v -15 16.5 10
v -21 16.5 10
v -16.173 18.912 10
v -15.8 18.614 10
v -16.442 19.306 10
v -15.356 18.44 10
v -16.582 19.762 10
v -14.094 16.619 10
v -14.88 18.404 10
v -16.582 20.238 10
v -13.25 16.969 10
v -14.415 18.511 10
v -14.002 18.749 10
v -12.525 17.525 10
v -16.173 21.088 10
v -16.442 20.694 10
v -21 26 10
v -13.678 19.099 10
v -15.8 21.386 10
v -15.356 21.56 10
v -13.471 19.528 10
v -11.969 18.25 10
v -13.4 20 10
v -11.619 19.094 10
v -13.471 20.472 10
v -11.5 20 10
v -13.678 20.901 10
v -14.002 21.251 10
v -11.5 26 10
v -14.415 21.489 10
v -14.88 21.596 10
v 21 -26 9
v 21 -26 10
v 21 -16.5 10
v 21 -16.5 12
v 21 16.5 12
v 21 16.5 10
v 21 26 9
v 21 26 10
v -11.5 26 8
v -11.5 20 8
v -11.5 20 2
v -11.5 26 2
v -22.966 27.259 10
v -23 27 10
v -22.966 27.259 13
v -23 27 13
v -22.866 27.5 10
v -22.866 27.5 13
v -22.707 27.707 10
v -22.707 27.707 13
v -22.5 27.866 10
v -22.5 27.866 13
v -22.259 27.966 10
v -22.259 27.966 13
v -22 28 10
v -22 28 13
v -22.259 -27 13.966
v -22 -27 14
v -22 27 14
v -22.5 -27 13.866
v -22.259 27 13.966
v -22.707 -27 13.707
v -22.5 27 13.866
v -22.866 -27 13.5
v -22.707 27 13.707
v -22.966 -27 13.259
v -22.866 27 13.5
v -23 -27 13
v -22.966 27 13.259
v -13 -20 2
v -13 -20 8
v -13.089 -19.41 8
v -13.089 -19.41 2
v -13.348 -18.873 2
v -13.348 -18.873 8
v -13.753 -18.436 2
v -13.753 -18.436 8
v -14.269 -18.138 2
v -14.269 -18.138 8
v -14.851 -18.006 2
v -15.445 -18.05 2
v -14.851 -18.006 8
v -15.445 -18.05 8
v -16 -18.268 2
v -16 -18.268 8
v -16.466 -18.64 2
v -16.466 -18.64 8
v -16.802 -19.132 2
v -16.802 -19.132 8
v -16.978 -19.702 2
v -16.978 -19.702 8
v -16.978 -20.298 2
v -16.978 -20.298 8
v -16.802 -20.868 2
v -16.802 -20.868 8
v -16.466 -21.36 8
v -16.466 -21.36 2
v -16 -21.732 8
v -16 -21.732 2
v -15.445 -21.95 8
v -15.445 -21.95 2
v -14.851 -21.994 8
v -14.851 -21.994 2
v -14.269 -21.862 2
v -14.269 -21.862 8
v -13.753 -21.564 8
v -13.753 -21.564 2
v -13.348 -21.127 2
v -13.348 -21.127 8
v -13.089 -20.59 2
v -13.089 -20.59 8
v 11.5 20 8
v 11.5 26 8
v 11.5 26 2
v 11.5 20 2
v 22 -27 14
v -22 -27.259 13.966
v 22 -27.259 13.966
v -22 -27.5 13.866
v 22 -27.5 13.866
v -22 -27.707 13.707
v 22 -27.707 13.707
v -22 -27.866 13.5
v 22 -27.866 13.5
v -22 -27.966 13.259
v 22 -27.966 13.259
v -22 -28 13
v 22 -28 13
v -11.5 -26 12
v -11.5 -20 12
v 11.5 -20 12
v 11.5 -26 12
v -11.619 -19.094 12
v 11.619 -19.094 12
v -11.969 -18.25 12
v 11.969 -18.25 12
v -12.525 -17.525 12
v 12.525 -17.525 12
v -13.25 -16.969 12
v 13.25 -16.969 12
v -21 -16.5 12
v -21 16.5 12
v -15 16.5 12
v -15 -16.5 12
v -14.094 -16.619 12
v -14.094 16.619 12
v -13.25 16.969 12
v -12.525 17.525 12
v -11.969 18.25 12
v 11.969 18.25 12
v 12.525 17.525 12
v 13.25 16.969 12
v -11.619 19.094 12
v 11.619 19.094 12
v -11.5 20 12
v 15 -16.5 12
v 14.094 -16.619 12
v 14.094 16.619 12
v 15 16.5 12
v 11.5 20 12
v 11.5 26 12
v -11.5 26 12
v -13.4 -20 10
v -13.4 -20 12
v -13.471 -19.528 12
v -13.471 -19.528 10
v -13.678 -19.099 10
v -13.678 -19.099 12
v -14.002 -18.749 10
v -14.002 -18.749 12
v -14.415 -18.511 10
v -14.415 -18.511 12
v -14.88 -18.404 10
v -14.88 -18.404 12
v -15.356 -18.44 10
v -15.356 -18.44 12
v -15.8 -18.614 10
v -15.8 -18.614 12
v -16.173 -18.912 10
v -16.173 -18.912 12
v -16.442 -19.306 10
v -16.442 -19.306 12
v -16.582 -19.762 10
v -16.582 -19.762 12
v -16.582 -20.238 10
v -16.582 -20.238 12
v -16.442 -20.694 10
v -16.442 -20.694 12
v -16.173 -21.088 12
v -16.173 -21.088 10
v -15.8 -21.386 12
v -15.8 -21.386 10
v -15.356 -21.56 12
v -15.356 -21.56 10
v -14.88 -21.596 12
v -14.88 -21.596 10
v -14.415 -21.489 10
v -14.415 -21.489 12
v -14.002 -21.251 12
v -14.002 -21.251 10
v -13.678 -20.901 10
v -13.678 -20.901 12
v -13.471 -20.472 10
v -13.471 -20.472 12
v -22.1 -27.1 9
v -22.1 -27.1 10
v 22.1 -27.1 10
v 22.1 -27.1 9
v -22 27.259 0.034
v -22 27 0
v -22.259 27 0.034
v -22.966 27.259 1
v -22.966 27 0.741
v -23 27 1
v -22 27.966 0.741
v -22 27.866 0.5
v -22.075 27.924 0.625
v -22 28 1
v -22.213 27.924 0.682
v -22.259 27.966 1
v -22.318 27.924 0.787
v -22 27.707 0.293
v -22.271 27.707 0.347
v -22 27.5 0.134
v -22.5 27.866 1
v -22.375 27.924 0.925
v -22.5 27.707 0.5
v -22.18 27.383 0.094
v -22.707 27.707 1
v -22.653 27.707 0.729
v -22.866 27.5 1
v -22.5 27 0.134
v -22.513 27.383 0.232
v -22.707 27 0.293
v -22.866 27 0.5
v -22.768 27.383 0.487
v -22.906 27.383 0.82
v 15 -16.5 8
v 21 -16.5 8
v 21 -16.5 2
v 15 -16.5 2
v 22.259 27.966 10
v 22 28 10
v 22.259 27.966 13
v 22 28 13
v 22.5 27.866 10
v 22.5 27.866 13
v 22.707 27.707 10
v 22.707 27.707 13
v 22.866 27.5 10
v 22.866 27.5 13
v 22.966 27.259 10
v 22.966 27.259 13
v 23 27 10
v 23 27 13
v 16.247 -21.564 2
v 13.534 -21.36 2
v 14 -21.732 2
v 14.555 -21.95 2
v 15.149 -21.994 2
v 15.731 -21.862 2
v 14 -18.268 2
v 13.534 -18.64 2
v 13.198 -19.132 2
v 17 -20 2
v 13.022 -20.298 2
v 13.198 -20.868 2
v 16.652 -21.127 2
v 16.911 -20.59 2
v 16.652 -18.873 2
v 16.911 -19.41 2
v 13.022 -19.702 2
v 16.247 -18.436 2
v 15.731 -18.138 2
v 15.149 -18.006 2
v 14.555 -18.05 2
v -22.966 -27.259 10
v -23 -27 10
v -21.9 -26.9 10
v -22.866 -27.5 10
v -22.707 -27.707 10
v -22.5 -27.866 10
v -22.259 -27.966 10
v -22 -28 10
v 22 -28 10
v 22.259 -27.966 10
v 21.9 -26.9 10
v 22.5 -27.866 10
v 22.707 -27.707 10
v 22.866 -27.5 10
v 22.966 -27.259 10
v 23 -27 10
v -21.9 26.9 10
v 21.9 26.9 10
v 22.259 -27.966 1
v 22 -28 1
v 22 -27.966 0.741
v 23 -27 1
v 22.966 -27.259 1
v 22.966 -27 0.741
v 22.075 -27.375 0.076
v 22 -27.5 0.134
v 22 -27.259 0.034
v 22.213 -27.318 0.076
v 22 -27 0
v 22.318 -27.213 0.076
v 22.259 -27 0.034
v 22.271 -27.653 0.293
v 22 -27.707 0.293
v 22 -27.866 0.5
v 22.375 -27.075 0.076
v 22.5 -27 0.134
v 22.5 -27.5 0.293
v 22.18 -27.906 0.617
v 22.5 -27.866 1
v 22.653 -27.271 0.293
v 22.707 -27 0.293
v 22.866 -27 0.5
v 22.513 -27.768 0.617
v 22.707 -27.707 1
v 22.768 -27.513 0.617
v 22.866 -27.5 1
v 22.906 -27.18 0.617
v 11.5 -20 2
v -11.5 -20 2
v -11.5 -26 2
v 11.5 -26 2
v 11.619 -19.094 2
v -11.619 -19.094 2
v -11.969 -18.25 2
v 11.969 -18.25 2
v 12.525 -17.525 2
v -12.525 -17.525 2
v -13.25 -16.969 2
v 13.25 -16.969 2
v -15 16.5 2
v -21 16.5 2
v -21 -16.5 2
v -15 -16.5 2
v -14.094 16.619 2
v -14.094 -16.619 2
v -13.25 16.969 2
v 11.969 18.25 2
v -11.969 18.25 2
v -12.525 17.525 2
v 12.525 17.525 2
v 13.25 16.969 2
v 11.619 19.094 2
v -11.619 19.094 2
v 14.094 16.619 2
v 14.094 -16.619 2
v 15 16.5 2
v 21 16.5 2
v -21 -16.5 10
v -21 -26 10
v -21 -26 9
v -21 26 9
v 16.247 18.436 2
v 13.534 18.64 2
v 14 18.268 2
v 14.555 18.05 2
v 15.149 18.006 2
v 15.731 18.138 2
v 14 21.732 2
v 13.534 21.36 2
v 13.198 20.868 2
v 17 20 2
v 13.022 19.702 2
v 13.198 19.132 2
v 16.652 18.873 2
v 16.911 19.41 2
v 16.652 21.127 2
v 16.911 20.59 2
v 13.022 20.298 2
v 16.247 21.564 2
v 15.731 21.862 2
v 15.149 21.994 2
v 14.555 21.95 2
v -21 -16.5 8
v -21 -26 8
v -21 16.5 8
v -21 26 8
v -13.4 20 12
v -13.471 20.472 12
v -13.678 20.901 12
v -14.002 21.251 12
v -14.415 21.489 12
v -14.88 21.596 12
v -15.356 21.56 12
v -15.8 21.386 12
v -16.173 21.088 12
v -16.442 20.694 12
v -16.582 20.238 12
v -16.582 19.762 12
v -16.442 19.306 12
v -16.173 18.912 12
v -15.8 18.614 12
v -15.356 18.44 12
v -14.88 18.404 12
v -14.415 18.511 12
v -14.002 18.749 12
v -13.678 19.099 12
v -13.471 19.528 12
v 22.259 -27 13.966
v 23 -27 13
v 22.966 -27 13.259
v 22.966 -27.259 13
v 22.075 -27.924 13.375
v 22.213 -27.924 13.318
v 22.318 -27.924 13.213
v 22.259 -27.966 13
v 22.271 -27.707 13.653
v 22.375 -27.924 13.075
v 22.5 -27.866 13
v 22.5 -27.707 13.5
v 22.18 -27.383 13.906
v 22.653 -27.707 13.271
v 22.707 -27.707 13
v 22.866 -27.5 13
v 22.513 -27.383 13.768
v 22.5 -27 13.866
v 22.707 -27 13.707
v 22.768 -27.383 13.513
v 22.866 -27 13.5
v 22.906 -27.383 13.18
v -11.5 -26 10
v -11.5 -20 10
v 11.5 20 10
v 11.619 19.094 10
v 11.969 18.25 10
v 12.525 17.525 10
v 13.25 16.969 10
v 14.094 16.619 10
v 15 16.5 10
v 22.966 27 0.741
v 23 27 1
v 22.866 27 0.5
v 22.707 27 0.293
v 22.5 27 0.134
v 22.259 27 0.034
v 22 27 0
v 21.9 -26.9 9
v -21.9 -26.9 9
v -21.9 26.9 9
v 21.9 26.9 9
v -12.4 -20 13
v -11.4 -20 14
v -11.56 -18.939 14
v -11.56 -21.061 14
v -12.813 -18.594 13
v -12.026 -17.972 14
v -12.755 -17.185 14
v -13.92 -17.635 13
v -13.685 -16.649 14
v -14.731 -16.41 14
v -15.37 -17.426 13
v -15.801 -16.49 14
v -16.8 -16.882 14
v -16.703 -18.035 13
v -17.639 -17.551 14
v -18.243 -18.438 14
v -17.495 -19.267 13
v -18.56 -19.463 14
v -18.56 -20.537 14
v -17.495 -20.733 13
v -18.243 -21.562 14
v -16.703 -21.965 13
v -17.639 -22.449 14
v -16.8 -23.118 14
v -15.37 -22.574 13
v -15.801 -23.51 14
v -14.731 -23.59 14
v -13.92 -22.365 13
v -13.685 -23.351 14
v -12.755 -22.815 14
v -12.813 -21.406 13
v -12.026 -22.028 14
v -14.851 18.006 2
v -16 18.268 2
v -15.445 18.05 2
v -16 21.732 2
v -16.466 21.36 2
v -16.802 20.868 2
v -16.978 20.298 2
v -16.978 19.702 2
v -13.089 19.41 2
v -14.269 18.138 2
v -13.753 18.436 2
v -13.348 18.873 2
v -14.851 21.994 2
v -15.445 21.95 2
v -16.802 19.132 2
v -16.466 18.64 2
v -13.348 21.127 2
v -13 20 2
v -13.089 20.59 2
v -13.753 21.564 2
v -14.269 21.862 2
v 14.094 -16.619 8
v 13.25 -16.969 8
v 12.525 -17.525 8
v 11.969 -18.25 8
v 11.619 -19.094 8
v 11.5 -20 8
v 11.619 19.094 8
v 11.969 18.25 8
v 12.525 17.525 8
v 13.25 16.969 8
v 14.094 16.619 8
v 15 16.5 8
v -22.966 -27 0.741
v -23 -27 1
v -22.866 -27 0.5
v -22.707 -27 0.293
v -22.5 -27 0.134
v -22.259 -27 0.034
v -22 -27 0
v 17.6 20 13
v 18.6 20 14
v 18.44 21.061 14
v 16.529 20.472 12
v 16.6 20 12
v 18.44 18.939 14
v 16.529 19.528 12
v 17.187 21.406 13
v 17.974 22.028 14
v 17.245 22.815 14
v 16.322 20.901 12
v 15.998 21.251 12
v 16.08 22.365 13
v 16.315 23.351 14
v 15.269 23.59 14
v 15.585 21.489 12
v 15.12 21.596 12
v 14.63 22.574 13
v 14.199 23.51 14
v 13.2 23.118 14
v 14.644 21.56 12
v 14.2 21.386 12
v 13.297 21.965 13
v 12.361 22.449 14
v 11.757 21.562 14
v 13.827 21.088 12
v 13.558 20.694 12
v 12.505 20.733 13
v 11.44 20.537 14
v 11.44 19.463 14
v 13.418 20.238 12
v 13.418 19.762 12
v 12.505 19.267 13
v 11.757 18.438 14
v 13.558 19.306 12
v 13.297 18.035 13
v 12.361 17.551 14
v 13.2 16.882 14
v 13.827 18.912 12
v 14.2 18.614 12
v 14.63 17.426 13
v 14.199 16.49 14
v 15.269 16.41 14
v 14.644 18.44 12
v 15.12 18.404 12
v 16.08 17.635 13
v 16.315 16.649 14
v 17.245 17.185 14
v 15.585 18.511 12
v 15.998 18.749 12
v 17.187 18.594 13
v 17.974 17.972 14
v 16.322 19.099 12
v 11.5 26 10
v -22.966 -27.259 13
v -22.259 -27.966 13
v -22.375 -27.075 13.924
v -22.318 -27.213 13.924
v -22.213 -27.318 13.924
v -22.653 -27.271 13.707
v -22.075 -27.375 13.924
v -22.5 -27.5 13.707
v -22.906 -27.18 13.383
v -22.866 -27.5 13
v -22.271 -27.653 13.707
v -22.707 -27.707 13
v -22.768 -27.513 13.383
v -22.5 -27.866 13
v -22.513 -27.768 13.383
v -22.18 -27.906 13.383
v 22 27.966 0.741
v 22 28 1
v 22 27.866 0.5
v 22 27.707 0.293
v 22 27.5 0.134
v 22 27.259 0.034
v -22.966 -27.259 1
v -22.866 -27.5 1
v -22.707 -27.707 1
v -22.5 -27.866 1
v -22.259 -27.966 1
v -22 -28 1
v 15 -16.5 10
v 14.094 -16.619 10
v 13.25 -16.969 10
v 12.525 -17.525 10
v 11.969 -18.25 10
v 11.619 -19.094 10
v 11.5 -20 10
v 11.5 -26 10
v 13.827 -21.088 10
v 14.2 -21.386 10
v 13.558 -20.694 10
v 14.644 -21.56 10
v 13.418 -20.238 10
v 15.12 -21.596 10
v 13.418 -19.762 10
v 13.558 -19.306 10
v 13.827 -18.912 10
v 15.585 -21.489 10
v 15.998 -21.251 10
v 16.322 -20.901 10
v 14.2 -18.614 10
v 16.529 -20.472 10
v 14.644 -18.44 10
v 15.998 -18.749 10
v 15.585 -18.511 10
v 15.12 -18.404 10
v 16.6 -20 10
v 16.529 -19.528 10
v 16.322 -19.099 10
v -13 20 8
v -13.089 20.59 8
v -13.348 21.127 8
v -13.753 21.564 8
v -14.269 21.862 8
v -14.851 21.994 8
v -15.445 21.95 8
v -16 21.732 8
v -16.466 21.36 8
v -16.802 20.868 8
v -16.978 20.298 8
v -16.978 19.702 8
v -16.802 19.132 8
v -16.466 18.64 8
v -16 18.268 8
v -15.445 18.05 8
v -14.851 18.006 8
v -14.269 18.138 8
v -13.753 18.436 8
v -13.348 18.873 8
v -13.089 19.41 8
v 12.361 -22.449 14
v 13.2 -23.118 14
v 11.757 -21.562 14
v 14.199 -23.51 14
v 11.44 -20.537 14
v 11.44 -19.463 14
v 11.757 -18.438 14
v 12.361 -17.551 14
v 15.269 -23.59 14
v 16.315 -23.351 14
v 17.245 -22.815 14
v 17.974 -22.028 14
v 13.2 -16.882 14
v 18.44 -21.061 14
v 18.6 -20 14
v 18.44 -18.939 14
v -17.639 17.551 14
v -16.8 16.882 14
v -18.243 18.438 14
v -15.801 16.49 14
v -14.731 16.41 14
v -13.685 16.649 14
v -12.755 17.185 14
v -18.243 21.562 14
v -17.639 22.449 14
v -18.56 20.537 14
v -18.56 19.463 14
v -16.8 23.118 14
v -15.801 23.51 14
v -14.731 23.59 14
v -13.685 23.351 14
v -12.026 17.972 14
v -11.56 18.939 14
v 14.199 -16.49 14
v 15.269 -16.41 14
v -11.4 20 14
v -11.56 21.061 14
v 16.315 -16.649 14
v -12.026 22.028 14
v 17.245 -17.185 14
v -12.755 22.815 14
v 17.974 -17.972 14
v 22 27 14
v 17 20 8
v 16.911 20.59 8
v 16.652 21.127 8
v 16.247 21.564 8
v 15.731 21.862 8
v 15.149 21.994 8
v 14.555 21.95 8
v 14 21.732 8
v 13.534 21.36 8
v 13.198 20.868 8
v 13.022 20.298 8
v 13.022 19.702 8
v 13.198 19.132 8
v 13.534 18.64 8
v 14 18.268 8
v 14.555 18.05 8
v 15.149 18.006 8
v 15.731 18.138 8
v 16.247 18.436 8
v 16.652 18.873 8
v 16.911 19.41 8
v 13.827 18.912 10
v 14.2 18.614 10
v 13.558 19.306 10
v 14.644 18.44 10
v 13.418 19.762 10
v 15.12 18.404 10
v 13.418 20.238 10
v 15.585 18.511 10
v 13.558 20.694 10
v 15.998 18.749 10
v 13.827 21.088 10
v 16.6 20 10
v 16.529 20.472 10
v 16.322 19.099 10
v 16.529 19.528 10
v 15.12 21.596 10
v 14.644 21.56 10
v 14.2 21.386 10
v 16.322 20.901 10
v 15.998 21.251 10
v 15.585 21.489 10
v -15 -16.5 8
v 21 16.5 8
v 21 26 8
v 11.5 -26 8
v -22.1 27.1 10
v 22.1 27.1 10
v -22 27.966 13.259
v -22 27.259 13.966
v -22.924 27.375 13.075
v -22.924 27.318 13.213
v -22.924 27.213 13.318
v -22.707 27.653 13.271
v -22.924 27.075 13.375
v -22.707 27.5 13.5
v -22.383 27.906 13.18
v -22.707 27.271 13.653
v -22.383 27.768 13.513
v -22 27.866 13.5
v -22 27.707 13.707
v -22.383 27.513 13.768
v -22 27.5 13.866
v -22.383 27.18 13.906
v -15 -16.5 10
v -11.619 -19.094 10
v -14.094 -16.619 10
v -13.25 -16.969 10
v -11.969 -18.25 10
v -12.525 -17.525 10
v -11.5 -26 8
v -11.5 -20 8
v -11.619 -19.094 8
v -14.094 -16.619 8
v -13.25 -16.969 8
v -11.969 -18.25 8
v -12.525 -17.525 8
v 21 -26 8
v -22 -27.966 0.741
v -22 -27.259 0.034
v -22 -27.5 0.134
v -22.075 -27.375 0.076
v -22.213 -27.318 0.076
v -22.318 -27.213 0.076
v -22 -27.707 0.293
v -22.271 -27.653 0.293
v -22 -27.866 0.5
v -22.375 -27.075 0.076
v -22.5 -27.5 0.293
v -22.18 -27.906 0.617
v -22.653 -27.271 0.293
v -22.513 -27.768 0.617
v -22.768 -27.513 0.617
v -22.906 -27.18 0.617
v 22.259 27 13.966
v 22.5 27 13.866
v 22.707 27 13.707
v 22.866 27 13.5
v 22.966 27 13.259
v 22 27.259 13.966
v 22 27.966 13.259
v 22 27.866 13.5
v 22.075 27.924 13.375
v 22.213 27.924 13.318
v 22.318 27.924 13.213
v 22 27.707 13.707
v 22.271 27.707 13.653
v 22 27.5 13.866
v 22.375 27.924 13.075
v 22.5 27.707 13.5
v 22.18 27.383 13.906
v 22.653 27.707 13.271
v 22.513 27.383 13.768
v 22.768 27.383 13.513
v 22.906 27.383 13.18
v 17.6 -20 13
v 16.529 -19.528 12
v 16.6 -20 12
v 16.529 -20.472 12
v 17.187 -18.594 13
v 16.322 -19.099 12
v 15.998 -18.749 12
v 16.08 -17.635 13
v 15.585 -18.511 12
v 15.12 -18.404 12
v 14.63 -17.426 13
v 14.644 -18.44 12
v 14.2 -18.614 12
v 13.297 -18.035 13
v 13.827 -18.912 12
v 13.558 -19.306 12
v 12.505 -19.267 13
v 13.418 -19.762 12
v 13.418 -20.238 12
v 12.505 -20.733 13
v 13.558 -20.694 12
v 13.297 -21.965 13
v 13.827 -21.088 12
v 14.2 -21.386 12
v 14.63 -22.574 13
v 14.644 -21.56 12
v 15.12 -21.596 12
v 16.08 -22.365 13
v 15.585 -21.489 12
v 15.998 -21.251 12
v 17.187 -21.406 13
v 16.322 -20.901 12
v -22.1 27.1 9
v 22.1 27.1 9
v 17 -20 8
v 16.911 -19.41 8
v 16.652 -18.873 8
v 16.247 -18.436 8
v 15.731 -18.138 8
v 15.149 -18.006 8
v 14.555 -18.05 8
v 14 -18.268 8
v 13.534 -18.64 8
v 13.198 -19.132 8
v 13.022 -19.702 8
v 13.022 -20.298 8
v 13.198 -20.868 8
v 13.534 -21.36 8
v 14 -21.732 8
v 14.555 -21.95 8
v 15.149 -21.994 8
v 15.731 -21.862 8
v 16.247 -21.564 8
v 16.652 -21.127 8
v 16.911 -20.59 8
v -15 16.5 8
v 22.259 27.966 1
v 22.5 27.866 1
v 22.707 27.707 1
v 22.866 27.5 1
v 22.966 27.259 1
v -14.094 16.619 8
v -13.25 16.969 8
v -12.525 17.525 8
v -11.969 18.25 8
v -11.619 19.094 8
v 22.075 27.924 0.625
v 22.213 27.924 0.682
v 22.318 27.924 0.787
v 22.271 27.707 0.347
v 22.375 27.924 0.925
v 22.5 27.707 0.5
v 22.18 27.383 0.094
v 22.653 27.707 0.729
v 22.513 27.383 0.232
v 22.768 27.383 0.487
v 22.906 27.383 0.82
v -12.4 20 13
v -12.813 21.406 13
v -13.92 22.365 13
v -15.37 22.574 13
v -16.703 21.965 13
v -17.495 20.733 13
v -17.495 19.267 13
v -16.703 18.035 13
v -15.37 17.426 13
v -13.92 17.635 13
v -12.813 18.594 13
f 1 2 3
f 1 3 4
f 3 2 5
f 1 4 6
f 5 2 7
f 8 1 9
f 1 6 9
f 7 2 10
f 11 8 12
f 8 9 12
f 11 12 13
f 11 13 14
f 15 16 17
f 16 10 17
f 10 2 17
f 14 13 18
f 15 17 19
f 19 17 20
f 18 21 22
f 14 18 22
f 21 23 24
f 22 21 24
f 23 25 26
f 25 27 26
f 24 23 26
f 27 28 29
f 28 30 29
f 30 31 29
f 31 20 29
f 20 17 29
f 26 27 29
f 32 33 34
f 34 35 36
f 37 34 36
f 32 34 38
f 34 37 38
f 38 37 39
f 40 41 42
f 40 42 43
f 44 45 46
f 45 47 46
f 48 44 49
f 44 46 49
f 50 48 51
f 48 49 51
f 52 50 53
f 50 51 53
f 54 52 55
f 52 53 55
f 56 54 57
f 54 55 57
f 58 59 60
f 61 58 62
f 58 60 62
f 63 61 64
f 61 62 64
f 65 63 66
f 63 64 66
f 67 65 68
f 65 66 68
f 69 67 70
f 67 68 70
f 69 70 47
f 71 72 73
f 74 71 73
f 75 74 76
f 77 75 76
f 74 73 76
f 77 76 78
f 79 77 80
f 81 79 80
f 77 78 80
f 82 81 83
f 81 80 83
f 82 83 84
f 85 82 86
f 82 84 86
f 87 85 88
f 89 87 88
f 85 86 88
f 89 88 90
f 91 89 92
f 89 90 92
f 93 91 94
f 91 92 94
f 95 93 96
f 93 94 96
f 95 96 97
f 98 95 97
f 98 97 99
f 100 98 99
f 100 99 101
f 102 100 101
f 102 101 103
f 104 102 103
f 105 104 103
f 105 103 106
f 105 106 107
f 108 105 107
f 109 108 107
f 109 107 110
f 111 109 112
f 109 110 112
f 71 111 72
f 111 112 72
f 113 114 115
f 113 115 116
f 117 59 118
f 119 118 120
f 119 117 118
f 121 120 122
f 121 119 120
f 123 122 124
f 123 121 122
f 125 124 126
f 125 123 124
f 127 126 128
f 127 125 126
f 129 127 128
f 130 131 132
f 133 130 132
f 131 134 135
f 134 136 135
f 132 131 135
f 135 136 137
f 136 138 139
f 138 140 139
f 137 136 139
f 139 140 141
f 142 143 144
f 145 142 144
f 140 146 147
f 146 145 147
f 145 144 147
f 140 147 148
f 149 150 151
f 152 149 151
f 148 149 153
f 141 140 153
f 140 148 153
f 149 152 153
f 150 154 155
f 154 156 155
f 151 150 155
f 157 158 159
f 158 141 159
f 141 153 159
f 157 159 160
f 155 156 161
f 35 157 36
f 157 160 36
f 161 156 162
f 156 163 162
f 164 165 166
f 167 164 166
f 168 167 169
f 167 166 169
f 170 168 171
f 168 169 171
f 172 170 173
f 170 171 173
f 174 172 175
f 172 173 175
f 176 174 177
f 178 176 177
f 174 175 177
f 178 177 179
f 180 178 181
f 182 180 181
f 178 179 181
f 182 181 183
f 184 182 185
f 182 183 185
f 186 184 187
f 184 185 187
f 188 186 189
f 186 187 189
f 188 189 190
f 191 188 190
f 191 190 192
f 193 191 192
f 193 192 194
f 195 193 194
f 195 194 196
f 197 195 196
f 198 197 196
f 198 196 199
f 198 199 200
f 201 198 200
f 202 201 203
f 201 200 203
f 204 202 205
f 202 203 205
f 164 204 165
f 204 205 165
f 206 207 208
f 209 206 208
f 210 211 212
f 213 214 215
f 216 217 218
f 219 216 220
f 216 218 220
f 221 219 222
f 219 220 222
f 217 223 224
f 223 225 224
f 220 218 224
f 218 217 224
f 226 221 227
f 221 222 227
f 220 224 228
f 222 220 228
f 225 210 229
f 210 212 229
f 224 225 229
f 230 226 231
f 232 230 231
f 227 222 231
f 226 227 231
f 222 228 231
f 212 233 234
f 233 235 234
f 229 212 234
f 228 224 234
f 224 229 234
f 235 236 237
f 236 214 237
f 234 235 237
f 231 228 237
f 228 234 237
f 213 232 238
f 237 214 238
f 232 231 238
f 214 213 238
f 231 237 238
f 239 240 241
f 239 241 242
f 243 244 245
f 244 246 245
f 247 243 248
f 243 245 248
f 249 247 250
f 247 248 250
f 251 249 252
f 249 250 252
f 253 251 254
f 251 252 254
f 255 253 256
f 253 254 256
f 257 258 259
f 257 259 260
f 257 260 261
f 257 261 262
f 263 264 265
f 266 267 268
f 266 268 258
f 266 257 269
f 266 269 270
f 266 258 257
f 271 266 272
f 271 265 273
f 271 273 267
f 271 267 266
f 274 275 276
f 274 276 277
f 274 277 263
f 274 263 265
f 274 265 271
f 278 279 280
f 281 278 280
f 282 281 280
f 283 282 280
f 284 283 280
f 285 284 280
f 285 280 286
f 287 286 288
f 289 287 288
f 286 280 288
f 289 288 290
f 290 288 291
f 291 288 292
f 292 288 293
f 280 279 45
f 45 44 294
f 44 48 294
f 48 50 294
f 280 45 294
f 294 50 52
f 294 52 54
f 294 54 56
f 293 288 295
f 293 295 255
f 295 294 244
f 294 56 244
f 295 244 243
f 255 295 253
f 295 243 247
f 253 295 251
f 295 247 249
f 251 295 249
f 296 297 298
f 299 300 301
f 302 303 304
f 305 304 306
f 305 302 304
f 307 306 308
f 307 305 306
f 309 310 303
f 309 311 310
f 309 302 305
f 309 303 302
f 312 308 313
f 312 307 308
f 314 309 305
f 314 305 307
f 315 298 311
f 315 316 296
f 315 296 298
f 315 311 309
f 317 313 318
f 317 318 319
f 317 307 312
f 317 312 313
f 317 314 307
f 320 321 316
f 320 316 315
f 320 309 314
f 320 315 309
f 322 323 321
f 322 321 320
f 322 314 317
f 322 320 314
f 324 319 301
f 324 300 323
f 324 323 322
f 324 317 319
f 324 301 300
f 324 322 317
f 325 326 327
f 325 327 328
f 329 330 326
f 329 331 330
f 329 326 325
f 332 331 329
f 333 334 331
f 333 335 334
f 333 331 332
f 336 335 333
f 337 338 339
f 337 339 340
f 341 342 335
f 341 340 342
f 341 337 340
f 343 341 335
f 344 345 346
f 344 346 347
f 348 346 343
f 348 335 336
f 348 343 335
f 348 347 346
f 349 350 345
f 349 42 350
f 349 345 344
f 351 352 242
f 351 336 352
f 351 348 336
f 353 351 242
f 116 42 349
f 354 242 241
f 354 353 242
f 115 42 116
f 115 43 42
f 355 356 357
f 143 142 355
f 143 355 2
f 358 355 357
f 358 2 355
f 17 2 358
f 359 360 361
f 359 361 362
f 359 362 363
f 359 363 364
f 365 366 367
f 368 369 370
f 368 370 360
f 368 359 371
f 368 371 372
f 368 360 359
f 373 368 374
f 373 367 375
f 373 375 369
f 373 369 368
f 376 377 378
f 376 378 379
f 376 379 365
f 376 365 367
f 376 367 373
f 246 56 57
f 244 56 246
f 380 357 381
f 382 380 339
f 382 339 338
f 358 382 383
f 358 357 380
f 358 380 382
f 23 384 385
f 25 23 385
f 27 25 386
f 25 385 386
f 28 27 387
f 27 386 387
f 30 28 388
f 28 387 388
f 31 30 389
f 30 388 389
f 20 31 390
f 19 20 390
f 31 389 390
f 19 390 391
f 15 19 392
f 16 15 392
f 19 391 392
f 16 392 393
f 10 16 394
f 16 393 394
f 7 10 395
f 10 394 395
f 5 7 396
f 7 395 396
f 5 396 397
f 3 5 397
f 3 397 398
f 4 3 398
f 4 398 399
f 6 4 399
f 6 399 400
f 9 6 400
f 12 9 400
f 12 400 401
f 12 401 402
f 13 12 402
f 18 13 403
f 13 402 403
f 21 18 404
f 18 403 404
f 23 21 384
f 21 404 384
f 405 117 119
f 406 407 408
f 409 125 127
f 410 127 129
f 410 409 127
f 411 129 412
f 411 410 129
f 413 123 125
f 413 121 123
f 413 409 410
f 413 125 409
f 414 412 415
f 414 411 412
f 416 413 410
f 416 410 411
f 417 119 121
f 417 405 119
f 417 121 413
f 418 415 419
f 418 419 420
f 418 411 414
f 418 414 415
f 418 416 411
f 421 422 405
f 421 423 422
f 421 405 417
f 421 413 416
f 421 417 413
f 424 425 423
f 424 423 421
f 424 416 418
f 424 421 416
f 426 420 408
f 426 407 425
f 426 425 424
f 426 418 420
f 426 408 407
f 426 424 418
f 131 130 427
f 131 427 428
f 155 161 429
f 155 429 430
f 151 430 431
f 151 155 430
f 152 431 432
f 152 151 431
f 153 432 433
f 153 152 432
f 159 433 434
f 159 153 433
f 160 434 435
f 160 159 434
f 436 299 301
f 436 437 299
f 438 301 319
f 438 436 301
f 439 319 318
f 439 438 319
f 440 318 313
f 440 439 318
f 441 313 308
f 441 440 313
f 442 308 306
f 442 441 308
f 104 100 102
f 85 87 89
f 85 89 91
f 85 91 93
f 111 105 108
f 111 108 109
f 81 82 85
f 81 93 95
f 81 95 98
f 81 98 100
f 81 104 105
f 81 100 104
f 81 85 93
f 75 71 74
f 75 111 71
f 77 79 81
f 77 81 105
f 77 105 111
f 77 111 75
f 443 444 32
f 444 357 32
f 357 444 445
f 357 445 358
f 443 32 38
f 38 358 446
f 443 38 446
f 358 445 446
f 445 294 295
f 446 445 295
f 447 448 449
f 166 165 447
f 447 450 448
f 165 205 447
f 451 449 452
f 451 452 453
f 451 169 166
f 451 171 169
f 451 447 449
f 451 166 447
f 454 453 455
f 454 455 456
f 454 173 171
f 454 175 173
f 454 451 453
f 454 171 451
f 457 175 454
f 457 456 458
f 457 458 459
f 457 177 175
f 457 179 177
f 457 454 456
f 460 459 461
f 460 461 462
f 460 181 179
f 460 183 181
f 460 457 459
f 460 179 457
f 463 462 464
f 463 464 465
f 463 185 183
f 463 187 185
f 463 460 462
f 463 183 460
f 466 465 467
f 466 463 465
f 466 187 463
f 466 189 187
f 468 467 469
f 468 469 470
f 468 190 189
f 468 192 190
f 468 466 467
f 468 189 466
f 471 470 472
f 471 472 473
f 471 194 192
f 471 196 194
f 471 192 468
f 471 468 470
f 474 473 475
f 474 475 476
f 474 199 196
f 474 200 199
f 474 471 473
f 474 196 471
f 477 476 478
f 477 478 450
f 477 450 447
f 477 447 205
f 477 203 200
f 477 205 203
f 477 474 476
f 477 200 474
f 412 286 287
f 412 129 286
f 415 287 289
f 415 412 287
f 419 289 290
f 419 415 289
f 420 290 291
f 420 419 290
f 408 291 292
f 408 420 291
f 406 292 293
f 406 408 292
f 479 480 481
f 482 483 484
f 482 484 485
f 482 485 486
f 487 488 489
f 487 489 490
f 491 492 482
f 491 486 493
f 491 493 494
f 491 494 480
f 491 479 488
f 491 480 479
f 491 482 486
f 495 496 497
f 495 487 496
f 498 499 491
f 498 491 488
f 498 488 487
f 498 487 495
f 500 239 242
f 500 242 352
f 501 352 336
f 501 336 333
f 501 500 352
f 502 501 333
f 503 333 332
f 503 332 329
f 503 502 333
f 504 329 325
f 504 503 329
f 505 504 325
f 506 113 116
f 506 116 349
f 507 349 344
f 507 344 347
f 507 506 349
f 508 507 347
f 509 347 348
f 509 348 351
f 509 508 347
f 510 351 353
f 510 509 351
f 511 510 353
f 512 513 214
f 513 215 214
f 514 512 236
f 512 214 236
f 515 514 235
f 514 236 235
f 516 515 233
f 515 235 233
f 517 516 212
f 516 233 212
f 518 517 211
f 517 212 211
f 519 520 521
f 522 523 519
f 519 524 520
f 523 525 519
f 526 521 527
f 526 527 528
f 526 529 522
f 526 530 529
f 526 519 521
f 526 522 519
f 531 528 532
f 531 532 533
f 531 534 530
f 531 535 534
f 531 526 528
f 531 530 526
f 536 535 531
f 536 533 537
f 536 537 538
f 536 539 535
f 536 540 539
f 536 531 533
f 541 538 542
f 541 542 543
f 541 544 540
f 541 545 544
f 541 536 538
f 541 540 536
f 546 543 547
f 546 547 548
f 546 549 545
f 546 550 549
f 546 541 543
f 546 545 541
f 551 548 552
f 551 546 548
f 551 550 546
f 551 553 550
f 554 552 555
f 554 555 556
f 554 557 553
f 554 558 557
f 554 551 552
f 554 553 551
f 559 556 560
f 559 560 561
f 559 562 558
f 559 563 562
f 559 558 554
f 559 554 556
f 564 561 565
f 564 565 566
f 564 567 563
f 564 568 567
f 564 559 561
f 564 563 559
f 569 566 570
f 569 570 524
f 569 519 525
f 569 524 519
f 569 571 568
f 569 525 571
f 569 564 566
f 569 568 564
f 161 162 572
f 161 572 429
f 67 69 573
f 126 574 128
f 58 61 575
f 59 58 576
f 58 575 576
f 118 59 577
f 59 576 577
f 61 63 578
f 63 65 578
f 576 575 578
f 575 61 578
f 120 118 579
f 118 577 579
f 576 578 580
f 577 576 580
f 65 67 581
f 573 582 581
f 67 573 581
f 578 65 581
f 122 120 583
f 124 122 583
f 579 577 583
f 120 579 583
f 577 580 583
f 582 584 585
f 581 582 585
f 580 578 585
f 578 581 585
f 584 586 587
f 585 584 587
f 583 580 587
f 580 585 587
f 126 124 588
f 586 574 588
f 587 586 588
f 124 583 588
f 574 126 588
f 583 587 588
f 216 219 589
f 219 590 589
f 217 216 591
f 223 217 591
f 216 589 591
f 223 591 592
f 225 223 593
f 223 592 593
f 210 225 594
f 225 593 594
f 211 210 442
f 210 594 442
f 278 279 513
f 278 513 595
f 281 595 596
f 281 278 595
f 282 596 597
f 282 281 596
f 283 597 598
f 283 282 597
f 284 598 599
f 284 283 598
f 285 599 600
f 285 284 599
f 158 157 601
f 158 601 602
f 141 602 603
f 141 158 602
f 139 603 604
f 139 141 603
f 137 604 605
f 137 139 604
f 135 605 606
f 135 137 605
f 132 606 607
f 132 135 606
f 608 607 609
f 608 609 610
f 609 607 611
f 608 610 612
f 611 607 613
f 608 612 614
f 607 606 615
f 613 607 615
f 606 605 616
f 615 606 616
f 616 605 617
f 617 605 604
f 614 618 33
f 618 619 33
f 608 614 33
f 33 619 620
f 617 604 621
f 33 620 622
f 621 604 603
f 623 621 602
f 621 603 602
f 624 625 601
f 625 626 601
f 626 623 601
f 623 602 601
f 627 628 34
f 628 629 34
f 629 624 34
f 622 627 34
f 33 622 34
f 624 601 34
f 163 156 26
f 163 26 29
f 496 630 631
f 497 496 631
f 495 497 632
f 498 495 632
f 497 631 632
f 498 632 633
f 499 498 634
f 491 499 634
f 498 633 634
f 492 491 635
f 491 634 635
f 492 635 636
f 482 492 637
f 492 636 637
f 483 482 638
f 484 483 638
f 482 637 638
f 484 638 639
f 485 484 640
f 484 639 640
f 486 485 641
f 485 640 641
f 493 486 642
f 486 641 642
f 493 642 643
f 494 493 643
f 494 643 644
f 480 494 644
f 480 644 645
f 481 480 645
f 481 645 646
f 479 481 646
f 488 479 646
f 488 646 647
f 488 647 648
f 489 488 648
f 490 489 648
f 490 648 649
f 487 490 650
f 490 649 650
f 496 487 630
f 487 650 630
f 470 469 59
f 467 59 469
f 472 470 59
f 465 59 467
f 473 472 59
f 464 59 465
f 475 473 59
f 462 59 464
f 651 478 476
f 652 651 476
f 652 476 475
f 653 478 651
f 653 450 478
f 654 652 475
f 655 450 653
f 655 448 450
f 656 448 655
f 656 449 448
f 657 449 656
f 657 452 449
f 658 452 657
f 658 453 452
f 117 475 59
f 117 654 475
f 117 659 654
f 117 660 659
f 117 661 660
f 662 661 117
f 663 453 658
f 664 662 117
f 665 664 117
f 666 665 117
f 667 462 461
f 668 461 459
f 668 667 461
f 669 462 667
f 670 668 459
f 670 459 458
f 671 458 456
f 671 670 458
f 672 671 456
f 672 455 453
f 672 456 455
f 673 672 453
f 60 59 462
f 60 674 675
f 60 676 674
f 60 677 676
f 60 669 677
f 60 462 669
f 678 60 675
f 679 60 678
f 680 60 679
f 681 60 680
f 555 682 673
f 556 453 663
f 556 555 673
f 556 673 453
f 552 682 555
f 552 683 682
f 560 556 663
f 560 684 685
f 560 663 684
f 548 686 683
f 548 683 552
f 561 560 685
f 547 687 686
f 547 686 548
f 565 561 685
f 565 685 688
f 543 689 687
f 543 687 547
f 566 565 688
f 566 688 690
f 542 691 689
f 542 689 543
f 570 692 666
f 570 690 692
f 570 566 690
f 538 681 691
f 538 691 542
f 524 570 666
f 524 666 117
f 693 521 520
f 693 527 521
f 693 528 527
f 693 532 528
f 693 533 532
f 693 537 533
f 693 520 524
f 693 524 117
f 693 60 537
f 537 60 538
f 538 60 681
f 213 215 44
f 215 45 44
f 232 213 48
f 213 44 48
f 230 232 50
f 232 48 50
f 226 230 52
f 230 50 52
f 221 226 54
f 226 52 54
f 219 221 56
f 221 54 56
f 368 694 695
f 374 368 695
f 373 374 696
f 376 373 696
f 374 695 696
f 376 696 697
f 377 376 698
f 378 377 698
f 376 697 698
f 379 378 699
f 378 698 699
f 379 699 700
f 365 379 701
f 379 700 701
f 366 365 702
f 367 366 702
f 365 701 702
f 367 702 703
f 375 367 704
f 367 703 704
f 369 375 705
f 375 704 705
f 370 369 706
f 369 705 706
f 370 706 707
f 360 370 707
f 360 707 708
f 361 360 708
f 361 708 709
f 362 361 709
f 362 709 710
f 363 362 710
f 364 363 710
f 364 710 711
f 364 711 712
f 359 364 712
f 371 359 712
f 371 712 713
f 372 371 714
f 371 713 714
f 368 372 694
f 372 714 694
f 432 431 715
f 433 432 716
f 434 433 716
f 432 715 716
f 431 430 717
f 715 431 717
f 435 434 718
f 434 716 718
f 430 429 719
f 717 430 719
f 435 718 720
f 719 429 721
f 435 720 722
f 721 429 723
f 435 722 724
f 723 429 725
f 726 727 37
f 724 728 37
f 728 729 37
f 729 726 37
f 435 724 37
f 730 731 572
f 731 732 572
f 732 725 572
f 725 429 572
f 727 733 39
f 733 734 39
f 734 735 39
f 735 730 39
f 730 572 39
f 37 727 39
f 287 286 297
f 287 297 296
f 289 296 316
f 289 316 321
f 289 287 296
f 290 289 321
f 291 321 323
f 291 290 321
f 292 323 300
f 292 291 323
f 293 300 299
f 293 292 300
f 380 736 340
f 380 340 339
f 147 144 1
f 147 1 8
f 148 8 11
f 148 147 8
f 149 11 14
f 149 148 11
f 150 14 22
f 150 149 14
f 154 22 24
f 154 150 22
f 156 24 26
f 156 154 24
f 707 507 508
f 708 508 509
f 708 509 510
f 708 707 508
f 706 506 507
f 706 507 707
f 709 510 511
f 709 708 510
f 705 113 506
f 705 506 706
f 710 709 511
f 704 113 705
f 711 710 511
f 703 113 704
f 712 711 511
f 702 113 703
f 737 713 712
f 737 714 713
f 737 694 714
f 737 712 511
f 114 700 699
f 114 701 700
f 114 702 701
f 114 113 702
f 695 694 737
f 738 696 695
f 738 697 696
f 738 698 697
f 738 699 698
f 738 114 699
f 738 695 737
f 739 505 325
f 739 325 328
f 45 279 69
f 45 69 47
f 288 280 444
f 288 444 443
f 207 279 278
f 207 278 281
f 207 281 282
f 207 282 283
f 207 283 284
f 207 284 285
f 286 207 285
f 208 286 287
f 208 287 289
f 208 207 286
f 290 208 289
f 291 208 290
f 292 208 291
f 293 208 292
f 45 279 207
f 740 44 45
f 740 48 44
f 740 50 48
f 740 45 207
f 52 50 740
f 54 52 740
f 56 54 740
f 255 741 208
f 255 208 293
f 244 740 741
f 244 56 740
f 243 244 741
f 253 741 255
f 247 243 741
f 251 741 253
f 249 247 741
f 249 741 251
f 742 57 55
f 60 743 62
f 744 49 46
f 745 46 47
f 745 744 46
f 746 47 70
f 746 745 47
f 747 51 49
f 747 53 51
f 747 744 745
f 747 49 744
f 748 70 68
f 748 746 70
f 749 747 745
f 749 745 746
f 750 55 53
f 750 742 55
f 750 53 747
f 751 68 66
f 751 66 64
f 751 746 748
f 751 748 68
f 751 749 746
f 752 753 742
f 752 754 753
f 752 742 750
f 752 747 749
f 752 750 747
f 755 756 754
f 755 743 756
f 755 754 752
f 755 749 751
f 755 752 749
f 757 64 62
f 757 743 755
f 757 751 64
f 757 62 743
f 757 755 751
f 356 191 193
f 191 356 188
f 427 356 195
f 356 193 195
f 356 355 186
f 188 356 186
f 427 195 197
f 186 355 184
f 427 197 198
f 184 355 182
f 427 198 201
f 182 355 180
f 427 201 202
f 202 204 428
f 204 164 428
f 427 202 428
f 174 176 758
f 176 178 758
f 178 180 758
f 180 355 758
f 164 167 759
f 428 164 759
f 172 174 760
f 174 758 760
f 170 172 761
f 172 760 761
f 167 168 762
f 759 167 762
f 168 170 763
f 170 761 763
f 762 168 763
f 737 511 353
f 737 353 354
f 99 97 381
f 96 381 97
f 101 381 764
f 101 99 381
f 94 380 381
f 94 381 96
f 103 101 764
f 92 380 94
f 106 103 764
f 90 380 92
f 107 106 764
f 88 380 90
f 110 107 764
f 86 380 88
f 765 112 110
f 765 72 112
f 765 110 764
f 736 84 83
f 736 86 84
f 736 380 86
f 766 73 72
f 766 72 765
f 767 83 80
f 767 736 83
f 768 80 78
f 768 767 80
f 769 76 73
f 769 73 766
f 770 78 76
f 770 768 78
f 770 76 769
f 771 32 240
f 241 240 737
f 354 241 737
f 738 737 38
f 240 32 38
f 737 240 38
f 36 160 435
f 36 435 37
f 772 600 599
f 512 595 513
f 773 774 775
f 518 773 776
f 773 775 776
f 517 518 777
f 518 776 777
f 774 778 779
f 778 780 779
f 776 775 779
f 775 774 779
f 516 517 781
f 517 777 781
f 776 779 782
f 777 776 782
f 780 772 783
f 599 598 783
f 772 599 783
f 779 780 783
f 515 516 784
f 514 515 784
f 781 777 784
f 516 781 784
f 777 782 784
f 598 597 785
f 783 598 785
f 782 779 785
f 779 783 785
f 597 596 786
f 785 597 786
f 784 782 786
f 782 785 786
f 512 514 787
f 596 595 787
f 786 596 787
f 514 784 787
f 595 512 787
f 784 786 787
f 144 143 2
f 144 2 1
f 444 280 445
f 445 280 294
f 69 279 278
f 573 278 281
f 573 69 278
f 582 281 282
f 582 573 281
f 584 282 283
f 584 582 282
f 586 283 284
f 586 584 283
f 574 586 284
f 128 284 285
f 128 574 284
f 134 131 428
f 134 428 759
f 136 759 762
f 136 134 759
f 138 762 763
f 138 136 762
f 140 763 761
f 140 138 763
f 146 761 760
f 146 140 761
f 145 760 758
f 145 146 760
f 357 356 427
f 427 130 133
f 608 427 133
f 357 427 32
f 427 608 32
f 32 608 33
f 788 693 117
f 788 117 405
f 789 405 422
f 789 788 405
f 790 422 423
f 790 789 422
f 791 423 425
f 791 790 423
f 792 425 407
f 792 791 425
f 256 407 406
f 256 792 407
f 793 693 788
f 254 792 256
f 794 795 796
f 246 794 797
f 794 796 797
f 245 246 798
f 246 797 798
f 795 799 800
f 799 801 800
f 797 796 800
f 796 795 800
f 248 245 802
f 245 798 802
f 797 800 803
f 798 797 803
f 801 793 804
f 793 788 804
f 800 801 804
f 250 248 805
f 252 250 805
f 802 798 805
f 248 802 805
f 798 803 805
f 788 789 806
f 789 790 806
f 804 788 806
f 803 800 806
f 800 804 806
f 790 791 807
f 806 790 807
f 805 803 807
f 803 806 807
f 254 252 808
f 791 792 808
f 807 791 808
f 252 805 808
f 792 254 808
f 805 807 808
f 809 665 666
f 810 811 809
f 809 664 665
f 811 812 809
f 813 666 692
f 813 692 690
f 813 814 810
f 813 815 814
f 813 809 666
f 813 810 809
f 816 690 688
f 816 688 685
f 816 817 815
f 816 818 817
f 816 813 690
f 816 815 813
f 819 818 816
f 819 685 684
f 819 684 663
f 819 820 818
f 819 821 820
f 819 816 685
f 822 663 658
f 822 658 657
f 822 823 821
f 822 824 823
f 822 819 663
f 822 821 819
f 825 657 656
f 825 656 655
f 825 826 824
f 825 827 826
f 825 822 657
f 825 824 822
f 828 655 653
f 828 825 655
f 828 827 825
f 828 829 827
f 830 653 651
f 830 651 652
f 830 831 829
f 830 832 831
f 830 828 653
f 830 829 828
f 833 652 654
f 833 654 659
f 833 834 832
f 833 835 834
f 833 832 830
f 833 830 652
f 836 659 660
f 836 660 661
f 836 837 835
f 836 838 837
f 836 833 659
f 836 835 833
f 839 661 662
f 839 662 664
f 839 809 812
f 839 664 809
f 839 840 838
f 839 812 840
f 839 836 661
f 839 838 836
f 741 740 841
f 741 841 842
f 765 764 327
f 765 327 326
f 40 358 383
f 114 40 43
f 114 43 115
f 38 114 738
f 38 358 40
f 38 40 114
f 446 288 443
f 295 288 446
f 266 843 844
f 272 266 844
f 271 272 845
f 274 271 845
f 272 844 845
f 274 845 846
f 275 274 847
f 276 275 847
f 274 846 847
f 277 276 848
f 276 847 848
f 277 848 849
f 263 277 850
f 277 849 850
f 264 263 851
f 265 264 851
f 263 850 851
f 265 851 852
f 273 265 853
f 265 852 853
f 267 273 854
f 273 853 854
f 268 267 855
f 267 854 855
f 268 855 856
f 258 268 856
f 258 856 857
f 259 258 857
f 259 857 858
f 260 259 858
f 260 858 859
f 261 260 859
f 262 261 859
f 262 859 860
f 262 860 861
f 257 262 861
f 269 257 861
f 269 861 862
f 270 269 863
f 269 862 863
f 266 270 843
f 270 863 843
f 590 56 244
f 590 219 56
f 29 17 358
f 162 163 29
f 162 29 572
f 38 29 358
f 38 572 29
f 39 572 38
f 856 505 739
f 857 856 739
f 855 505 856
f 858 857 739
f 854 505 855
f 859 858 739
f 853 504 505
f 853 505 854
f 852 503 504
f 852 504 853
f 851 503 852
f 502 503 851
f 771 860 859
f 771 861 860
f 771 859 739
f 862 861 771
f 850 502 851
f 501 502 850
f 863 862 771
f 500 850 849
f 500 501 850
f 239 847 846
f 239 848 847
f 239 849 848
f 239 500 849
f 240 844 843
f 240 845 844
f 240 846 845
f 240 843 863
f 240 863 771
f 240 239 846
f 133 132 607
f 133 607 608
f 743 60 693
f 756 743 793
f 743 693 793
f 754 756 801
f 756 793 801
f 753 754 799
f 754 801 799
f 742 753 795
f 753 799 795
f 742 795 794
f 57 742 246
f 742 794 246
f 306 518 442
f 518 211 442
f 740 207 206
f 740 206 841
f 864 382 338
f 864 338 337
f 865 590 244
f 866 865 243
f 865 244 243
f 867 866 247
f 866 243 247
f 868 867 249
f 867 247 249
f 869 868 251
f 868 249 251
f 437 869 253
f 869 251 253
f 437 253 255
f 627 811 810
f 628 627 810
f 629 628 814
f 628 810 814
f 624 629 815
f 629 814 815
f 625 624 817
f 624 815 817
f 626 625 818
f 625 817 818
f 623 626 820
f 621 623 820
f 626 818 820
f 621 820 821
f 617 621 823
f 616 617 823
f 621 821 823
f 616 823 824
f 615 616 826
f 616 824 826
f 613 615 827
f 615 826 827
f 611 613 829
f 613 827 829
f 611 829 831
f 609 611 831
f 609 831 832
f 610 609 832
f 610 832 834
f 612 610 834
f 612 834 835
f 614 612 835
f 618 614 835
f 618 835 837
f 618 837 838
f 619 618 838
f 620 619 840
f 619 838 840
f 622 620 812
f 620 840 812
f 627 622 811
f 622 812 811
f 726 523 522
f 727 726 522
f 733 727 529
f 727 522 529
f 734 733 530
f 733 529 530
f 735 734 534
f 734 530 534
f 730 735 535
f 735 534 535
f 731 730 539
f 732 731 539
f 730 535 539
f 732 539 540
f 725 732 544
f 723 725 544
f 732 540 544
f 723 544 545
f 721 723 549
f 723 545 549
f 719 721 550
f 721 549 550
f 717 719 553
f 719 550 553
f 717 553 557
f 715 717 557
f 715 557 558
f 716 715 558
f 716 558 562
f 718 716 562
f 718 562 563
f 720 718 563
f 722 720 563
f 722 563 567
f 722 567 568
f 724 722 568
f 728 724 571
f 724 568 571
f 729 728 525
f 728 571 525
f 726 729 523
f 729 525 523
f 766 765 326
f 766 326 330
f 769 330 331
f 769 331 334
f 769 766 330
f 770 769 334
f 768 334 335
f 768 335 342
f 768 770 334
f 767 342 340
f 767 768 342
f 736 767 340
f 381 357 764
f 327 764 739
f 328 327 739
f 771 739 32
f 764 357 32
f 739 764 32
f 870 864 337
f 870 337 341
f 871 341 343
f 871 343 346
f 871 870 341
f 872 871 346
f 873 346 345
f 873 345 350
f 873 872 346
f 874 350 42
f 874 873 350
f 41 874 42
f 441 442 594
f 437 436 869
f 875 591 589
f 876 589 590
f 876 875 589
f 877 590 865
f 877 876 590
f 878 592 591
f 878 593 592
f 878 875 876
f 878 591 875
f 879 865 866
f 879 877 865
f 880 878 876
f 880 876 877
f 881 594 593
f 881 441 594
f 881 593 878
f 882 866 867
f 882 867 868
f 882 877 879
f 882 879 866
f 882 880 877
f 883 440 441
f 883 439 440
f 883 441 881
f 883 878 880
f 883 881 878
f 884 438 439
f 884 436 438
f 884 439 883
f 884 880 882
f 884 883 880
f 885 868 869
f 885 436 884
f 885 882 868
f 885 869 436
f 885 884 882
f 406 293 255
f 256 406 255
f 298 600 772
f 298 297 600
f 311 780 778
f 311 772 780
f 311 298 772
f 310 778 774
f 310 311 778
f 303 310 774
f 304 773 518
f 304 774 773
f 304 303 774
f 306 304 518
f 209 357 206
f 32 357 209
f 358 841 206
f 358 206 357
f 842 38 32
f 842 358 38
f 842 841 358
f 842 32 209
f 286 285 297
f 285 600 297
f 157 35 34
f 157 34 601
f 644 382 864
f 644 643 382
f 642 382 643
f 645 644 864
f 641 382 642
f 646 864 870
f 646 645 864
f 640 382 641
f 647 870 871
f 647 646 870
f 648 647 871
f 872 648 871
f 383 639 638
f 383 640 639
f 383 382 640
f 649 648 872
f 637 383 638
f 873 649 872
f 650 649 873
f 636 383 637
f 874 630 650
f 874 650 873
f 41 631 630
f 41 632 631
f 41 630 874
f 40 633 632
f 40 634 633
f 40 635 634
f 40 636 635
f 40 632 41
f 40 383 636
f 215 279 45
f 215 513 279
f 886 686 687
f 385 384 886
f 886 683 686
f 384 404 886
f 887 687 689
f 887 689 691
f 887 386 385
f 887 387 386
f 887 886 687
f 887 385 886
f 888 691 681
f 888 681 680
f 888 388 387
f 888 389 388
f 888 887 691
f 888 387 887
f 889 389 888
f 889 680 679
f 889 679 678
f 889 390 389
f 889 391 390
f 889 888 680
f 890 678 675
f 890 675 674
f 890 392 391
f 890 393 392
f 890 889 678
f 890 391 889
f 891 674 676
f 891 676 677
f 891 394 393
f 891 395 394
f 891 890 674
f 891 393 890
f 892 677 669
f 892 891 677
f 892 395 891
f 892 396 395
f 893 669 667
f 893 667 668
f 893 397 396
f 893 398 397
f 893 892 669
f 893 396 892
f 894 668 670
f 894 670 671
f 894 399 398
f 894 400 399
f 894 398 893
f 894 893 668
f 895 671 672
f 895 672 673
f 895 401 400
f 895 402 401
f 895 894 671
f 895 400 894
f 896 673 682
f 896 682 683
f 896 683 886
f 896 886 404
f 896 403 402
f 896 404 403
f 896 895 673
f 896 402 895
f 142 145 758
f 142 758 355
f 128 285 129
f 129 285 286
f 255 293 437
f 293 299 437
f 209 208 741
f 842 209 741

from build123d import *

# Parameters (mm, degrees)
SKETCH_W        = 46
SKETCH_H        = 56
PAD_DEPTH       = 10
SKETCH001_W     = 42
SKETCH001_H     = 52
POCKET_DEPTH    = 8
SKETCH004_W     = 44.2
SKETCH004_H     = 54.2
POCKET002_DEPTH = 1
PAD004_DEPTH    = 6
SKETCH010_R     = 2
POCKET005_DEPTH = 6
FILLET_R        = 1
SKETCH002_W     = 46
SKETCH002_H     = 56
PAD001_DEPTH    = 4
SKETCH003_W     = 42
SKETCH003_H     = 52
POCKET001_DEPTH = 2
SKETCH005_W     = 43.8
SKETCH005_H     = 53.8
PAD002_DEPTH    = 1
SKETCH006_W     = 42
SKETCH006_H     = 52
POCKET003_DEPTH = 1
PAD005_DEPTH    = 2
SKETCH012_R     = 1.6
POCKET006_DEPTH = 4
FILLET001_R     = 1
CHAMFER_SIZE    = 2


with BuildPart() as boxbottom:
    # Sketch → Pad (new body)
    with BuildSketch(Plane.XY):
        Rectangle(SKETCH_W, SKETCH_H)
    extrude(amount=PAD_DEPTH)

    # Sketch001 (on DatumPlane) → Pocket (cut)
    with BuildSketch(Plane.XY.offset(10)):
        Rectangle(SKETCH001_W, SKETCH001_H)
    extrude(amount=-POCKET_DEPTH, mode=Mode.SUBTRACT)

    # Sketch004 (on DatumPlane) → Pocket002 (cut)
    with BuildSketch(Plane.XY.offset(10)):
        Rectangle(SKETCH004_W, SKETCH004_H)
    extrude(amount=-POCKET002_DEPTH, mode=Mode.SUBTRACT)

    # Sketch009 (on DatumPlane) → Pad004 (join)
    with BuildSketch(Plane.XY.offset(8)):
        with BuildLine():
            ThreePointArc((-11.5, -20), (-12.525126, -17.525126), (-15, -16.5))
            Line((-15, -16.5), (-21, -16.5))
            Line((-21, -16.5), (-21, -26))
            Line((-21, -26), (-11.5, -26))
            Line((-11.5, -26), (-11.5, -20))
        make_face()
        with BuildLine():
            ThreePointArc((15, -16.5), (12.525126, -17.525126), (11.5, -20))
            Line((11.5, -20), (11.5, -26))
            Line((11.5, -26), (21, -26))
            Line((21, -26), (21, -16.5))
            Line((21, -16.5), (15, -16.5))
        make_face()
        with BuildLine():
            ThreePointArc((11.5, 20), (12.525126, 17.525126), (15, 16.5))
            Line((15, 16.5), (21, 16.5))
            Line((21, 16.5), (21, 26))
            Line((21, 26), (11.5, 26))
            Line((11.5, 26), (11.5, 20))
        make_face()
        with BuildLine():
            ThreePointArc((-15, 16.5), (-12.525126, 17.525126), (-11.5, 20))
            Line((-11.5, 20), (-11.5, 26))
            Line((-11.5, 26), (-21, 26))
            Line((-21, 26), (-21, 16.5))
            Line((-21, 16.5), (-15, 16.5))
        make_face()
    extrude(amount=-PAD004_DEPTH)

    # Sketch010 (on DatumPlane) → Pocket005 (cut)
    with BuildSketch(Plane.XY.offset(8)):
        with Locations((15, 20)):
            Circle(SKETCH010_R)
        with Locations((-15, 20)):
            Circle(SKETCH010_R)
        with Locations((-15, -20)):
            Circle(SKETCH010_R)
        with Locations((15, -20)):
            Circle(SKETCH010_R)
    extrude(amount=-POCKET005_DEPTH, mode=Mode.SUBTRACT)

    # Fillet
    fillet_edges = [boxbottom.edges().sort_by_distance(p)[0] for p in [
        (23, -28, 5),
        (-23, -28, 5),
        (0, -28, 0),
        (-23, 0, 0),
        (23, 0, 0),
        (0, 28, 0),
        (23, 28, 5),
        (-23, 28, 5),
    ]]
    fillet(fillet_edges, radius=FILLET_R)


with BuildPart() as boxcover:
    # Sketch002 (on DatumPlane) → Pad001 (new body)
    with BuildSketch(Plane.XY.offset(10)):
        Rectangle(SKETCH002_W, SKETCH002_H)
    extrude(amount=PAD001_DEPTH)

    # Sketch003 (on DatumPlane) → Pocket001 (cut)
    with BuildSketch(Plane.XY.offset(10)):
        Rectangle(SKETCH003_W, SKETCH003_H)
    extrude(amount=POCKET001_DEPTH, mode=Mode.SUBTRACT)

    # Sketch005 (on DatumPlane) → Pad002 (join)
    with BuildSketch(Plane.XY.offset(10)):
        Rectangle(SKETCH005_W, SKETCH005_H)
    extrude(amount=-PAD002_DEPTH)

    # Sketch006 (on DatumPlane) → Pocket003 (cut)
    with BuildSketch(Plane.XY.offset(10)):
        Rectangle(SKETCH006_W, SKETCH006_H)
    extrude(amount=-POCKET003_DEPTH, mode=Mode.SUBTRACT)

    # Sketch011 (on DatumPlane) → Pad005 (join)
    with BuildSketch(Plane.XY.offset(12)):
        with BuildLine():
            ThreePointArc((-15, 16.5), (-12.525126, 17.525126), (-11.5, 20))
            Line((-11.5, 20), (-11.5, 26))
            Line((-11.5, 26), (-21, 26))
            Line((-21, 26), (-21, 16.5))
            Line((-21, 16.5), (-15, 16.5))
        make_face()
        with BuildLine():
            ThreePointArc((-11.5, -20), (-12.525126, -17.525126), (-15, -16.5))
            Line((-15, -16.5), (-21, -16.5))
            Line((-21, -16.5), (-21, -26))
            Line((-21, -26), (-11.5, -26))
            Line((-11.5, -26), (-11.5, -20))
        make_face()
        with BuildLine():
            ThreePointArc((15, -16.5), (12.525126, -17.525126), (11.5, -20))
            Line((11.5, -20), (11.5, -26))
            Line((11.5, -26), (21, -26))
            Line((21, -26), (21, -16.5))
            Line((21, -16.5), (15, -16.5))
        make_face()
        with BuildLine():
            ThreePointArc((11.5, 20), (12.525126, 17.525126), (15, 16.5))
            Line((15, 16.5), (21, 16.5))
            Line((21, 16.5), (21, 26))
            Line((21, 26), (11.5, 26))
            Line((11.5, 26), (11.5, 20))
        make_face()
    extrude(amount=-PAD005_DEPTH)

    # Sketch012 (on DatumPlane) → Pocket006 (cut)
    with BuildSketch(Plane.XY.offset(14)):
        with Locations((-15, 20)):
            Circle(SKETCH012_R)
        with Locations((15, 20)):
            Circle(SKETCH012_R)
        with Locations((15, -20)):
            Circle(SKETCH012_R)
        with Locations((-15, -20)):
            Circle(SKETCH012_R)
    extrude(amount=-POCKET006_DEPTH, mode=Mode.SUBTRACT)

    # Fillet001
    fillet001_edges = [boxcover.edges().sort_by_distance(p)[0] for p in [
        (23, 0, 14),
        (0, 28, 14),
        (23, 28, 12),
        (-23, 28, 12),
        (-23, -28, 12),
        (-23, 0, 14),
        (0, -28, 14),
        (23, -28, 12),
    ]]
    fillet(fillet001_edges, radius=FILLET001_R)

    # Chamfer
    chamfer_edges = [boxcover.edges().sort_by_distance(p)[0] for p in [
        (-16.6, 20, 14),
        (13.4, 20, 14),
        (13.4, -20, 14),
        (-16.6, -20, 14),
    ]]
    chamfer(chamfer_edges, length=CHAMFER_SIZE)


solid = Compound([boxbottom.part, boxcover.part])
